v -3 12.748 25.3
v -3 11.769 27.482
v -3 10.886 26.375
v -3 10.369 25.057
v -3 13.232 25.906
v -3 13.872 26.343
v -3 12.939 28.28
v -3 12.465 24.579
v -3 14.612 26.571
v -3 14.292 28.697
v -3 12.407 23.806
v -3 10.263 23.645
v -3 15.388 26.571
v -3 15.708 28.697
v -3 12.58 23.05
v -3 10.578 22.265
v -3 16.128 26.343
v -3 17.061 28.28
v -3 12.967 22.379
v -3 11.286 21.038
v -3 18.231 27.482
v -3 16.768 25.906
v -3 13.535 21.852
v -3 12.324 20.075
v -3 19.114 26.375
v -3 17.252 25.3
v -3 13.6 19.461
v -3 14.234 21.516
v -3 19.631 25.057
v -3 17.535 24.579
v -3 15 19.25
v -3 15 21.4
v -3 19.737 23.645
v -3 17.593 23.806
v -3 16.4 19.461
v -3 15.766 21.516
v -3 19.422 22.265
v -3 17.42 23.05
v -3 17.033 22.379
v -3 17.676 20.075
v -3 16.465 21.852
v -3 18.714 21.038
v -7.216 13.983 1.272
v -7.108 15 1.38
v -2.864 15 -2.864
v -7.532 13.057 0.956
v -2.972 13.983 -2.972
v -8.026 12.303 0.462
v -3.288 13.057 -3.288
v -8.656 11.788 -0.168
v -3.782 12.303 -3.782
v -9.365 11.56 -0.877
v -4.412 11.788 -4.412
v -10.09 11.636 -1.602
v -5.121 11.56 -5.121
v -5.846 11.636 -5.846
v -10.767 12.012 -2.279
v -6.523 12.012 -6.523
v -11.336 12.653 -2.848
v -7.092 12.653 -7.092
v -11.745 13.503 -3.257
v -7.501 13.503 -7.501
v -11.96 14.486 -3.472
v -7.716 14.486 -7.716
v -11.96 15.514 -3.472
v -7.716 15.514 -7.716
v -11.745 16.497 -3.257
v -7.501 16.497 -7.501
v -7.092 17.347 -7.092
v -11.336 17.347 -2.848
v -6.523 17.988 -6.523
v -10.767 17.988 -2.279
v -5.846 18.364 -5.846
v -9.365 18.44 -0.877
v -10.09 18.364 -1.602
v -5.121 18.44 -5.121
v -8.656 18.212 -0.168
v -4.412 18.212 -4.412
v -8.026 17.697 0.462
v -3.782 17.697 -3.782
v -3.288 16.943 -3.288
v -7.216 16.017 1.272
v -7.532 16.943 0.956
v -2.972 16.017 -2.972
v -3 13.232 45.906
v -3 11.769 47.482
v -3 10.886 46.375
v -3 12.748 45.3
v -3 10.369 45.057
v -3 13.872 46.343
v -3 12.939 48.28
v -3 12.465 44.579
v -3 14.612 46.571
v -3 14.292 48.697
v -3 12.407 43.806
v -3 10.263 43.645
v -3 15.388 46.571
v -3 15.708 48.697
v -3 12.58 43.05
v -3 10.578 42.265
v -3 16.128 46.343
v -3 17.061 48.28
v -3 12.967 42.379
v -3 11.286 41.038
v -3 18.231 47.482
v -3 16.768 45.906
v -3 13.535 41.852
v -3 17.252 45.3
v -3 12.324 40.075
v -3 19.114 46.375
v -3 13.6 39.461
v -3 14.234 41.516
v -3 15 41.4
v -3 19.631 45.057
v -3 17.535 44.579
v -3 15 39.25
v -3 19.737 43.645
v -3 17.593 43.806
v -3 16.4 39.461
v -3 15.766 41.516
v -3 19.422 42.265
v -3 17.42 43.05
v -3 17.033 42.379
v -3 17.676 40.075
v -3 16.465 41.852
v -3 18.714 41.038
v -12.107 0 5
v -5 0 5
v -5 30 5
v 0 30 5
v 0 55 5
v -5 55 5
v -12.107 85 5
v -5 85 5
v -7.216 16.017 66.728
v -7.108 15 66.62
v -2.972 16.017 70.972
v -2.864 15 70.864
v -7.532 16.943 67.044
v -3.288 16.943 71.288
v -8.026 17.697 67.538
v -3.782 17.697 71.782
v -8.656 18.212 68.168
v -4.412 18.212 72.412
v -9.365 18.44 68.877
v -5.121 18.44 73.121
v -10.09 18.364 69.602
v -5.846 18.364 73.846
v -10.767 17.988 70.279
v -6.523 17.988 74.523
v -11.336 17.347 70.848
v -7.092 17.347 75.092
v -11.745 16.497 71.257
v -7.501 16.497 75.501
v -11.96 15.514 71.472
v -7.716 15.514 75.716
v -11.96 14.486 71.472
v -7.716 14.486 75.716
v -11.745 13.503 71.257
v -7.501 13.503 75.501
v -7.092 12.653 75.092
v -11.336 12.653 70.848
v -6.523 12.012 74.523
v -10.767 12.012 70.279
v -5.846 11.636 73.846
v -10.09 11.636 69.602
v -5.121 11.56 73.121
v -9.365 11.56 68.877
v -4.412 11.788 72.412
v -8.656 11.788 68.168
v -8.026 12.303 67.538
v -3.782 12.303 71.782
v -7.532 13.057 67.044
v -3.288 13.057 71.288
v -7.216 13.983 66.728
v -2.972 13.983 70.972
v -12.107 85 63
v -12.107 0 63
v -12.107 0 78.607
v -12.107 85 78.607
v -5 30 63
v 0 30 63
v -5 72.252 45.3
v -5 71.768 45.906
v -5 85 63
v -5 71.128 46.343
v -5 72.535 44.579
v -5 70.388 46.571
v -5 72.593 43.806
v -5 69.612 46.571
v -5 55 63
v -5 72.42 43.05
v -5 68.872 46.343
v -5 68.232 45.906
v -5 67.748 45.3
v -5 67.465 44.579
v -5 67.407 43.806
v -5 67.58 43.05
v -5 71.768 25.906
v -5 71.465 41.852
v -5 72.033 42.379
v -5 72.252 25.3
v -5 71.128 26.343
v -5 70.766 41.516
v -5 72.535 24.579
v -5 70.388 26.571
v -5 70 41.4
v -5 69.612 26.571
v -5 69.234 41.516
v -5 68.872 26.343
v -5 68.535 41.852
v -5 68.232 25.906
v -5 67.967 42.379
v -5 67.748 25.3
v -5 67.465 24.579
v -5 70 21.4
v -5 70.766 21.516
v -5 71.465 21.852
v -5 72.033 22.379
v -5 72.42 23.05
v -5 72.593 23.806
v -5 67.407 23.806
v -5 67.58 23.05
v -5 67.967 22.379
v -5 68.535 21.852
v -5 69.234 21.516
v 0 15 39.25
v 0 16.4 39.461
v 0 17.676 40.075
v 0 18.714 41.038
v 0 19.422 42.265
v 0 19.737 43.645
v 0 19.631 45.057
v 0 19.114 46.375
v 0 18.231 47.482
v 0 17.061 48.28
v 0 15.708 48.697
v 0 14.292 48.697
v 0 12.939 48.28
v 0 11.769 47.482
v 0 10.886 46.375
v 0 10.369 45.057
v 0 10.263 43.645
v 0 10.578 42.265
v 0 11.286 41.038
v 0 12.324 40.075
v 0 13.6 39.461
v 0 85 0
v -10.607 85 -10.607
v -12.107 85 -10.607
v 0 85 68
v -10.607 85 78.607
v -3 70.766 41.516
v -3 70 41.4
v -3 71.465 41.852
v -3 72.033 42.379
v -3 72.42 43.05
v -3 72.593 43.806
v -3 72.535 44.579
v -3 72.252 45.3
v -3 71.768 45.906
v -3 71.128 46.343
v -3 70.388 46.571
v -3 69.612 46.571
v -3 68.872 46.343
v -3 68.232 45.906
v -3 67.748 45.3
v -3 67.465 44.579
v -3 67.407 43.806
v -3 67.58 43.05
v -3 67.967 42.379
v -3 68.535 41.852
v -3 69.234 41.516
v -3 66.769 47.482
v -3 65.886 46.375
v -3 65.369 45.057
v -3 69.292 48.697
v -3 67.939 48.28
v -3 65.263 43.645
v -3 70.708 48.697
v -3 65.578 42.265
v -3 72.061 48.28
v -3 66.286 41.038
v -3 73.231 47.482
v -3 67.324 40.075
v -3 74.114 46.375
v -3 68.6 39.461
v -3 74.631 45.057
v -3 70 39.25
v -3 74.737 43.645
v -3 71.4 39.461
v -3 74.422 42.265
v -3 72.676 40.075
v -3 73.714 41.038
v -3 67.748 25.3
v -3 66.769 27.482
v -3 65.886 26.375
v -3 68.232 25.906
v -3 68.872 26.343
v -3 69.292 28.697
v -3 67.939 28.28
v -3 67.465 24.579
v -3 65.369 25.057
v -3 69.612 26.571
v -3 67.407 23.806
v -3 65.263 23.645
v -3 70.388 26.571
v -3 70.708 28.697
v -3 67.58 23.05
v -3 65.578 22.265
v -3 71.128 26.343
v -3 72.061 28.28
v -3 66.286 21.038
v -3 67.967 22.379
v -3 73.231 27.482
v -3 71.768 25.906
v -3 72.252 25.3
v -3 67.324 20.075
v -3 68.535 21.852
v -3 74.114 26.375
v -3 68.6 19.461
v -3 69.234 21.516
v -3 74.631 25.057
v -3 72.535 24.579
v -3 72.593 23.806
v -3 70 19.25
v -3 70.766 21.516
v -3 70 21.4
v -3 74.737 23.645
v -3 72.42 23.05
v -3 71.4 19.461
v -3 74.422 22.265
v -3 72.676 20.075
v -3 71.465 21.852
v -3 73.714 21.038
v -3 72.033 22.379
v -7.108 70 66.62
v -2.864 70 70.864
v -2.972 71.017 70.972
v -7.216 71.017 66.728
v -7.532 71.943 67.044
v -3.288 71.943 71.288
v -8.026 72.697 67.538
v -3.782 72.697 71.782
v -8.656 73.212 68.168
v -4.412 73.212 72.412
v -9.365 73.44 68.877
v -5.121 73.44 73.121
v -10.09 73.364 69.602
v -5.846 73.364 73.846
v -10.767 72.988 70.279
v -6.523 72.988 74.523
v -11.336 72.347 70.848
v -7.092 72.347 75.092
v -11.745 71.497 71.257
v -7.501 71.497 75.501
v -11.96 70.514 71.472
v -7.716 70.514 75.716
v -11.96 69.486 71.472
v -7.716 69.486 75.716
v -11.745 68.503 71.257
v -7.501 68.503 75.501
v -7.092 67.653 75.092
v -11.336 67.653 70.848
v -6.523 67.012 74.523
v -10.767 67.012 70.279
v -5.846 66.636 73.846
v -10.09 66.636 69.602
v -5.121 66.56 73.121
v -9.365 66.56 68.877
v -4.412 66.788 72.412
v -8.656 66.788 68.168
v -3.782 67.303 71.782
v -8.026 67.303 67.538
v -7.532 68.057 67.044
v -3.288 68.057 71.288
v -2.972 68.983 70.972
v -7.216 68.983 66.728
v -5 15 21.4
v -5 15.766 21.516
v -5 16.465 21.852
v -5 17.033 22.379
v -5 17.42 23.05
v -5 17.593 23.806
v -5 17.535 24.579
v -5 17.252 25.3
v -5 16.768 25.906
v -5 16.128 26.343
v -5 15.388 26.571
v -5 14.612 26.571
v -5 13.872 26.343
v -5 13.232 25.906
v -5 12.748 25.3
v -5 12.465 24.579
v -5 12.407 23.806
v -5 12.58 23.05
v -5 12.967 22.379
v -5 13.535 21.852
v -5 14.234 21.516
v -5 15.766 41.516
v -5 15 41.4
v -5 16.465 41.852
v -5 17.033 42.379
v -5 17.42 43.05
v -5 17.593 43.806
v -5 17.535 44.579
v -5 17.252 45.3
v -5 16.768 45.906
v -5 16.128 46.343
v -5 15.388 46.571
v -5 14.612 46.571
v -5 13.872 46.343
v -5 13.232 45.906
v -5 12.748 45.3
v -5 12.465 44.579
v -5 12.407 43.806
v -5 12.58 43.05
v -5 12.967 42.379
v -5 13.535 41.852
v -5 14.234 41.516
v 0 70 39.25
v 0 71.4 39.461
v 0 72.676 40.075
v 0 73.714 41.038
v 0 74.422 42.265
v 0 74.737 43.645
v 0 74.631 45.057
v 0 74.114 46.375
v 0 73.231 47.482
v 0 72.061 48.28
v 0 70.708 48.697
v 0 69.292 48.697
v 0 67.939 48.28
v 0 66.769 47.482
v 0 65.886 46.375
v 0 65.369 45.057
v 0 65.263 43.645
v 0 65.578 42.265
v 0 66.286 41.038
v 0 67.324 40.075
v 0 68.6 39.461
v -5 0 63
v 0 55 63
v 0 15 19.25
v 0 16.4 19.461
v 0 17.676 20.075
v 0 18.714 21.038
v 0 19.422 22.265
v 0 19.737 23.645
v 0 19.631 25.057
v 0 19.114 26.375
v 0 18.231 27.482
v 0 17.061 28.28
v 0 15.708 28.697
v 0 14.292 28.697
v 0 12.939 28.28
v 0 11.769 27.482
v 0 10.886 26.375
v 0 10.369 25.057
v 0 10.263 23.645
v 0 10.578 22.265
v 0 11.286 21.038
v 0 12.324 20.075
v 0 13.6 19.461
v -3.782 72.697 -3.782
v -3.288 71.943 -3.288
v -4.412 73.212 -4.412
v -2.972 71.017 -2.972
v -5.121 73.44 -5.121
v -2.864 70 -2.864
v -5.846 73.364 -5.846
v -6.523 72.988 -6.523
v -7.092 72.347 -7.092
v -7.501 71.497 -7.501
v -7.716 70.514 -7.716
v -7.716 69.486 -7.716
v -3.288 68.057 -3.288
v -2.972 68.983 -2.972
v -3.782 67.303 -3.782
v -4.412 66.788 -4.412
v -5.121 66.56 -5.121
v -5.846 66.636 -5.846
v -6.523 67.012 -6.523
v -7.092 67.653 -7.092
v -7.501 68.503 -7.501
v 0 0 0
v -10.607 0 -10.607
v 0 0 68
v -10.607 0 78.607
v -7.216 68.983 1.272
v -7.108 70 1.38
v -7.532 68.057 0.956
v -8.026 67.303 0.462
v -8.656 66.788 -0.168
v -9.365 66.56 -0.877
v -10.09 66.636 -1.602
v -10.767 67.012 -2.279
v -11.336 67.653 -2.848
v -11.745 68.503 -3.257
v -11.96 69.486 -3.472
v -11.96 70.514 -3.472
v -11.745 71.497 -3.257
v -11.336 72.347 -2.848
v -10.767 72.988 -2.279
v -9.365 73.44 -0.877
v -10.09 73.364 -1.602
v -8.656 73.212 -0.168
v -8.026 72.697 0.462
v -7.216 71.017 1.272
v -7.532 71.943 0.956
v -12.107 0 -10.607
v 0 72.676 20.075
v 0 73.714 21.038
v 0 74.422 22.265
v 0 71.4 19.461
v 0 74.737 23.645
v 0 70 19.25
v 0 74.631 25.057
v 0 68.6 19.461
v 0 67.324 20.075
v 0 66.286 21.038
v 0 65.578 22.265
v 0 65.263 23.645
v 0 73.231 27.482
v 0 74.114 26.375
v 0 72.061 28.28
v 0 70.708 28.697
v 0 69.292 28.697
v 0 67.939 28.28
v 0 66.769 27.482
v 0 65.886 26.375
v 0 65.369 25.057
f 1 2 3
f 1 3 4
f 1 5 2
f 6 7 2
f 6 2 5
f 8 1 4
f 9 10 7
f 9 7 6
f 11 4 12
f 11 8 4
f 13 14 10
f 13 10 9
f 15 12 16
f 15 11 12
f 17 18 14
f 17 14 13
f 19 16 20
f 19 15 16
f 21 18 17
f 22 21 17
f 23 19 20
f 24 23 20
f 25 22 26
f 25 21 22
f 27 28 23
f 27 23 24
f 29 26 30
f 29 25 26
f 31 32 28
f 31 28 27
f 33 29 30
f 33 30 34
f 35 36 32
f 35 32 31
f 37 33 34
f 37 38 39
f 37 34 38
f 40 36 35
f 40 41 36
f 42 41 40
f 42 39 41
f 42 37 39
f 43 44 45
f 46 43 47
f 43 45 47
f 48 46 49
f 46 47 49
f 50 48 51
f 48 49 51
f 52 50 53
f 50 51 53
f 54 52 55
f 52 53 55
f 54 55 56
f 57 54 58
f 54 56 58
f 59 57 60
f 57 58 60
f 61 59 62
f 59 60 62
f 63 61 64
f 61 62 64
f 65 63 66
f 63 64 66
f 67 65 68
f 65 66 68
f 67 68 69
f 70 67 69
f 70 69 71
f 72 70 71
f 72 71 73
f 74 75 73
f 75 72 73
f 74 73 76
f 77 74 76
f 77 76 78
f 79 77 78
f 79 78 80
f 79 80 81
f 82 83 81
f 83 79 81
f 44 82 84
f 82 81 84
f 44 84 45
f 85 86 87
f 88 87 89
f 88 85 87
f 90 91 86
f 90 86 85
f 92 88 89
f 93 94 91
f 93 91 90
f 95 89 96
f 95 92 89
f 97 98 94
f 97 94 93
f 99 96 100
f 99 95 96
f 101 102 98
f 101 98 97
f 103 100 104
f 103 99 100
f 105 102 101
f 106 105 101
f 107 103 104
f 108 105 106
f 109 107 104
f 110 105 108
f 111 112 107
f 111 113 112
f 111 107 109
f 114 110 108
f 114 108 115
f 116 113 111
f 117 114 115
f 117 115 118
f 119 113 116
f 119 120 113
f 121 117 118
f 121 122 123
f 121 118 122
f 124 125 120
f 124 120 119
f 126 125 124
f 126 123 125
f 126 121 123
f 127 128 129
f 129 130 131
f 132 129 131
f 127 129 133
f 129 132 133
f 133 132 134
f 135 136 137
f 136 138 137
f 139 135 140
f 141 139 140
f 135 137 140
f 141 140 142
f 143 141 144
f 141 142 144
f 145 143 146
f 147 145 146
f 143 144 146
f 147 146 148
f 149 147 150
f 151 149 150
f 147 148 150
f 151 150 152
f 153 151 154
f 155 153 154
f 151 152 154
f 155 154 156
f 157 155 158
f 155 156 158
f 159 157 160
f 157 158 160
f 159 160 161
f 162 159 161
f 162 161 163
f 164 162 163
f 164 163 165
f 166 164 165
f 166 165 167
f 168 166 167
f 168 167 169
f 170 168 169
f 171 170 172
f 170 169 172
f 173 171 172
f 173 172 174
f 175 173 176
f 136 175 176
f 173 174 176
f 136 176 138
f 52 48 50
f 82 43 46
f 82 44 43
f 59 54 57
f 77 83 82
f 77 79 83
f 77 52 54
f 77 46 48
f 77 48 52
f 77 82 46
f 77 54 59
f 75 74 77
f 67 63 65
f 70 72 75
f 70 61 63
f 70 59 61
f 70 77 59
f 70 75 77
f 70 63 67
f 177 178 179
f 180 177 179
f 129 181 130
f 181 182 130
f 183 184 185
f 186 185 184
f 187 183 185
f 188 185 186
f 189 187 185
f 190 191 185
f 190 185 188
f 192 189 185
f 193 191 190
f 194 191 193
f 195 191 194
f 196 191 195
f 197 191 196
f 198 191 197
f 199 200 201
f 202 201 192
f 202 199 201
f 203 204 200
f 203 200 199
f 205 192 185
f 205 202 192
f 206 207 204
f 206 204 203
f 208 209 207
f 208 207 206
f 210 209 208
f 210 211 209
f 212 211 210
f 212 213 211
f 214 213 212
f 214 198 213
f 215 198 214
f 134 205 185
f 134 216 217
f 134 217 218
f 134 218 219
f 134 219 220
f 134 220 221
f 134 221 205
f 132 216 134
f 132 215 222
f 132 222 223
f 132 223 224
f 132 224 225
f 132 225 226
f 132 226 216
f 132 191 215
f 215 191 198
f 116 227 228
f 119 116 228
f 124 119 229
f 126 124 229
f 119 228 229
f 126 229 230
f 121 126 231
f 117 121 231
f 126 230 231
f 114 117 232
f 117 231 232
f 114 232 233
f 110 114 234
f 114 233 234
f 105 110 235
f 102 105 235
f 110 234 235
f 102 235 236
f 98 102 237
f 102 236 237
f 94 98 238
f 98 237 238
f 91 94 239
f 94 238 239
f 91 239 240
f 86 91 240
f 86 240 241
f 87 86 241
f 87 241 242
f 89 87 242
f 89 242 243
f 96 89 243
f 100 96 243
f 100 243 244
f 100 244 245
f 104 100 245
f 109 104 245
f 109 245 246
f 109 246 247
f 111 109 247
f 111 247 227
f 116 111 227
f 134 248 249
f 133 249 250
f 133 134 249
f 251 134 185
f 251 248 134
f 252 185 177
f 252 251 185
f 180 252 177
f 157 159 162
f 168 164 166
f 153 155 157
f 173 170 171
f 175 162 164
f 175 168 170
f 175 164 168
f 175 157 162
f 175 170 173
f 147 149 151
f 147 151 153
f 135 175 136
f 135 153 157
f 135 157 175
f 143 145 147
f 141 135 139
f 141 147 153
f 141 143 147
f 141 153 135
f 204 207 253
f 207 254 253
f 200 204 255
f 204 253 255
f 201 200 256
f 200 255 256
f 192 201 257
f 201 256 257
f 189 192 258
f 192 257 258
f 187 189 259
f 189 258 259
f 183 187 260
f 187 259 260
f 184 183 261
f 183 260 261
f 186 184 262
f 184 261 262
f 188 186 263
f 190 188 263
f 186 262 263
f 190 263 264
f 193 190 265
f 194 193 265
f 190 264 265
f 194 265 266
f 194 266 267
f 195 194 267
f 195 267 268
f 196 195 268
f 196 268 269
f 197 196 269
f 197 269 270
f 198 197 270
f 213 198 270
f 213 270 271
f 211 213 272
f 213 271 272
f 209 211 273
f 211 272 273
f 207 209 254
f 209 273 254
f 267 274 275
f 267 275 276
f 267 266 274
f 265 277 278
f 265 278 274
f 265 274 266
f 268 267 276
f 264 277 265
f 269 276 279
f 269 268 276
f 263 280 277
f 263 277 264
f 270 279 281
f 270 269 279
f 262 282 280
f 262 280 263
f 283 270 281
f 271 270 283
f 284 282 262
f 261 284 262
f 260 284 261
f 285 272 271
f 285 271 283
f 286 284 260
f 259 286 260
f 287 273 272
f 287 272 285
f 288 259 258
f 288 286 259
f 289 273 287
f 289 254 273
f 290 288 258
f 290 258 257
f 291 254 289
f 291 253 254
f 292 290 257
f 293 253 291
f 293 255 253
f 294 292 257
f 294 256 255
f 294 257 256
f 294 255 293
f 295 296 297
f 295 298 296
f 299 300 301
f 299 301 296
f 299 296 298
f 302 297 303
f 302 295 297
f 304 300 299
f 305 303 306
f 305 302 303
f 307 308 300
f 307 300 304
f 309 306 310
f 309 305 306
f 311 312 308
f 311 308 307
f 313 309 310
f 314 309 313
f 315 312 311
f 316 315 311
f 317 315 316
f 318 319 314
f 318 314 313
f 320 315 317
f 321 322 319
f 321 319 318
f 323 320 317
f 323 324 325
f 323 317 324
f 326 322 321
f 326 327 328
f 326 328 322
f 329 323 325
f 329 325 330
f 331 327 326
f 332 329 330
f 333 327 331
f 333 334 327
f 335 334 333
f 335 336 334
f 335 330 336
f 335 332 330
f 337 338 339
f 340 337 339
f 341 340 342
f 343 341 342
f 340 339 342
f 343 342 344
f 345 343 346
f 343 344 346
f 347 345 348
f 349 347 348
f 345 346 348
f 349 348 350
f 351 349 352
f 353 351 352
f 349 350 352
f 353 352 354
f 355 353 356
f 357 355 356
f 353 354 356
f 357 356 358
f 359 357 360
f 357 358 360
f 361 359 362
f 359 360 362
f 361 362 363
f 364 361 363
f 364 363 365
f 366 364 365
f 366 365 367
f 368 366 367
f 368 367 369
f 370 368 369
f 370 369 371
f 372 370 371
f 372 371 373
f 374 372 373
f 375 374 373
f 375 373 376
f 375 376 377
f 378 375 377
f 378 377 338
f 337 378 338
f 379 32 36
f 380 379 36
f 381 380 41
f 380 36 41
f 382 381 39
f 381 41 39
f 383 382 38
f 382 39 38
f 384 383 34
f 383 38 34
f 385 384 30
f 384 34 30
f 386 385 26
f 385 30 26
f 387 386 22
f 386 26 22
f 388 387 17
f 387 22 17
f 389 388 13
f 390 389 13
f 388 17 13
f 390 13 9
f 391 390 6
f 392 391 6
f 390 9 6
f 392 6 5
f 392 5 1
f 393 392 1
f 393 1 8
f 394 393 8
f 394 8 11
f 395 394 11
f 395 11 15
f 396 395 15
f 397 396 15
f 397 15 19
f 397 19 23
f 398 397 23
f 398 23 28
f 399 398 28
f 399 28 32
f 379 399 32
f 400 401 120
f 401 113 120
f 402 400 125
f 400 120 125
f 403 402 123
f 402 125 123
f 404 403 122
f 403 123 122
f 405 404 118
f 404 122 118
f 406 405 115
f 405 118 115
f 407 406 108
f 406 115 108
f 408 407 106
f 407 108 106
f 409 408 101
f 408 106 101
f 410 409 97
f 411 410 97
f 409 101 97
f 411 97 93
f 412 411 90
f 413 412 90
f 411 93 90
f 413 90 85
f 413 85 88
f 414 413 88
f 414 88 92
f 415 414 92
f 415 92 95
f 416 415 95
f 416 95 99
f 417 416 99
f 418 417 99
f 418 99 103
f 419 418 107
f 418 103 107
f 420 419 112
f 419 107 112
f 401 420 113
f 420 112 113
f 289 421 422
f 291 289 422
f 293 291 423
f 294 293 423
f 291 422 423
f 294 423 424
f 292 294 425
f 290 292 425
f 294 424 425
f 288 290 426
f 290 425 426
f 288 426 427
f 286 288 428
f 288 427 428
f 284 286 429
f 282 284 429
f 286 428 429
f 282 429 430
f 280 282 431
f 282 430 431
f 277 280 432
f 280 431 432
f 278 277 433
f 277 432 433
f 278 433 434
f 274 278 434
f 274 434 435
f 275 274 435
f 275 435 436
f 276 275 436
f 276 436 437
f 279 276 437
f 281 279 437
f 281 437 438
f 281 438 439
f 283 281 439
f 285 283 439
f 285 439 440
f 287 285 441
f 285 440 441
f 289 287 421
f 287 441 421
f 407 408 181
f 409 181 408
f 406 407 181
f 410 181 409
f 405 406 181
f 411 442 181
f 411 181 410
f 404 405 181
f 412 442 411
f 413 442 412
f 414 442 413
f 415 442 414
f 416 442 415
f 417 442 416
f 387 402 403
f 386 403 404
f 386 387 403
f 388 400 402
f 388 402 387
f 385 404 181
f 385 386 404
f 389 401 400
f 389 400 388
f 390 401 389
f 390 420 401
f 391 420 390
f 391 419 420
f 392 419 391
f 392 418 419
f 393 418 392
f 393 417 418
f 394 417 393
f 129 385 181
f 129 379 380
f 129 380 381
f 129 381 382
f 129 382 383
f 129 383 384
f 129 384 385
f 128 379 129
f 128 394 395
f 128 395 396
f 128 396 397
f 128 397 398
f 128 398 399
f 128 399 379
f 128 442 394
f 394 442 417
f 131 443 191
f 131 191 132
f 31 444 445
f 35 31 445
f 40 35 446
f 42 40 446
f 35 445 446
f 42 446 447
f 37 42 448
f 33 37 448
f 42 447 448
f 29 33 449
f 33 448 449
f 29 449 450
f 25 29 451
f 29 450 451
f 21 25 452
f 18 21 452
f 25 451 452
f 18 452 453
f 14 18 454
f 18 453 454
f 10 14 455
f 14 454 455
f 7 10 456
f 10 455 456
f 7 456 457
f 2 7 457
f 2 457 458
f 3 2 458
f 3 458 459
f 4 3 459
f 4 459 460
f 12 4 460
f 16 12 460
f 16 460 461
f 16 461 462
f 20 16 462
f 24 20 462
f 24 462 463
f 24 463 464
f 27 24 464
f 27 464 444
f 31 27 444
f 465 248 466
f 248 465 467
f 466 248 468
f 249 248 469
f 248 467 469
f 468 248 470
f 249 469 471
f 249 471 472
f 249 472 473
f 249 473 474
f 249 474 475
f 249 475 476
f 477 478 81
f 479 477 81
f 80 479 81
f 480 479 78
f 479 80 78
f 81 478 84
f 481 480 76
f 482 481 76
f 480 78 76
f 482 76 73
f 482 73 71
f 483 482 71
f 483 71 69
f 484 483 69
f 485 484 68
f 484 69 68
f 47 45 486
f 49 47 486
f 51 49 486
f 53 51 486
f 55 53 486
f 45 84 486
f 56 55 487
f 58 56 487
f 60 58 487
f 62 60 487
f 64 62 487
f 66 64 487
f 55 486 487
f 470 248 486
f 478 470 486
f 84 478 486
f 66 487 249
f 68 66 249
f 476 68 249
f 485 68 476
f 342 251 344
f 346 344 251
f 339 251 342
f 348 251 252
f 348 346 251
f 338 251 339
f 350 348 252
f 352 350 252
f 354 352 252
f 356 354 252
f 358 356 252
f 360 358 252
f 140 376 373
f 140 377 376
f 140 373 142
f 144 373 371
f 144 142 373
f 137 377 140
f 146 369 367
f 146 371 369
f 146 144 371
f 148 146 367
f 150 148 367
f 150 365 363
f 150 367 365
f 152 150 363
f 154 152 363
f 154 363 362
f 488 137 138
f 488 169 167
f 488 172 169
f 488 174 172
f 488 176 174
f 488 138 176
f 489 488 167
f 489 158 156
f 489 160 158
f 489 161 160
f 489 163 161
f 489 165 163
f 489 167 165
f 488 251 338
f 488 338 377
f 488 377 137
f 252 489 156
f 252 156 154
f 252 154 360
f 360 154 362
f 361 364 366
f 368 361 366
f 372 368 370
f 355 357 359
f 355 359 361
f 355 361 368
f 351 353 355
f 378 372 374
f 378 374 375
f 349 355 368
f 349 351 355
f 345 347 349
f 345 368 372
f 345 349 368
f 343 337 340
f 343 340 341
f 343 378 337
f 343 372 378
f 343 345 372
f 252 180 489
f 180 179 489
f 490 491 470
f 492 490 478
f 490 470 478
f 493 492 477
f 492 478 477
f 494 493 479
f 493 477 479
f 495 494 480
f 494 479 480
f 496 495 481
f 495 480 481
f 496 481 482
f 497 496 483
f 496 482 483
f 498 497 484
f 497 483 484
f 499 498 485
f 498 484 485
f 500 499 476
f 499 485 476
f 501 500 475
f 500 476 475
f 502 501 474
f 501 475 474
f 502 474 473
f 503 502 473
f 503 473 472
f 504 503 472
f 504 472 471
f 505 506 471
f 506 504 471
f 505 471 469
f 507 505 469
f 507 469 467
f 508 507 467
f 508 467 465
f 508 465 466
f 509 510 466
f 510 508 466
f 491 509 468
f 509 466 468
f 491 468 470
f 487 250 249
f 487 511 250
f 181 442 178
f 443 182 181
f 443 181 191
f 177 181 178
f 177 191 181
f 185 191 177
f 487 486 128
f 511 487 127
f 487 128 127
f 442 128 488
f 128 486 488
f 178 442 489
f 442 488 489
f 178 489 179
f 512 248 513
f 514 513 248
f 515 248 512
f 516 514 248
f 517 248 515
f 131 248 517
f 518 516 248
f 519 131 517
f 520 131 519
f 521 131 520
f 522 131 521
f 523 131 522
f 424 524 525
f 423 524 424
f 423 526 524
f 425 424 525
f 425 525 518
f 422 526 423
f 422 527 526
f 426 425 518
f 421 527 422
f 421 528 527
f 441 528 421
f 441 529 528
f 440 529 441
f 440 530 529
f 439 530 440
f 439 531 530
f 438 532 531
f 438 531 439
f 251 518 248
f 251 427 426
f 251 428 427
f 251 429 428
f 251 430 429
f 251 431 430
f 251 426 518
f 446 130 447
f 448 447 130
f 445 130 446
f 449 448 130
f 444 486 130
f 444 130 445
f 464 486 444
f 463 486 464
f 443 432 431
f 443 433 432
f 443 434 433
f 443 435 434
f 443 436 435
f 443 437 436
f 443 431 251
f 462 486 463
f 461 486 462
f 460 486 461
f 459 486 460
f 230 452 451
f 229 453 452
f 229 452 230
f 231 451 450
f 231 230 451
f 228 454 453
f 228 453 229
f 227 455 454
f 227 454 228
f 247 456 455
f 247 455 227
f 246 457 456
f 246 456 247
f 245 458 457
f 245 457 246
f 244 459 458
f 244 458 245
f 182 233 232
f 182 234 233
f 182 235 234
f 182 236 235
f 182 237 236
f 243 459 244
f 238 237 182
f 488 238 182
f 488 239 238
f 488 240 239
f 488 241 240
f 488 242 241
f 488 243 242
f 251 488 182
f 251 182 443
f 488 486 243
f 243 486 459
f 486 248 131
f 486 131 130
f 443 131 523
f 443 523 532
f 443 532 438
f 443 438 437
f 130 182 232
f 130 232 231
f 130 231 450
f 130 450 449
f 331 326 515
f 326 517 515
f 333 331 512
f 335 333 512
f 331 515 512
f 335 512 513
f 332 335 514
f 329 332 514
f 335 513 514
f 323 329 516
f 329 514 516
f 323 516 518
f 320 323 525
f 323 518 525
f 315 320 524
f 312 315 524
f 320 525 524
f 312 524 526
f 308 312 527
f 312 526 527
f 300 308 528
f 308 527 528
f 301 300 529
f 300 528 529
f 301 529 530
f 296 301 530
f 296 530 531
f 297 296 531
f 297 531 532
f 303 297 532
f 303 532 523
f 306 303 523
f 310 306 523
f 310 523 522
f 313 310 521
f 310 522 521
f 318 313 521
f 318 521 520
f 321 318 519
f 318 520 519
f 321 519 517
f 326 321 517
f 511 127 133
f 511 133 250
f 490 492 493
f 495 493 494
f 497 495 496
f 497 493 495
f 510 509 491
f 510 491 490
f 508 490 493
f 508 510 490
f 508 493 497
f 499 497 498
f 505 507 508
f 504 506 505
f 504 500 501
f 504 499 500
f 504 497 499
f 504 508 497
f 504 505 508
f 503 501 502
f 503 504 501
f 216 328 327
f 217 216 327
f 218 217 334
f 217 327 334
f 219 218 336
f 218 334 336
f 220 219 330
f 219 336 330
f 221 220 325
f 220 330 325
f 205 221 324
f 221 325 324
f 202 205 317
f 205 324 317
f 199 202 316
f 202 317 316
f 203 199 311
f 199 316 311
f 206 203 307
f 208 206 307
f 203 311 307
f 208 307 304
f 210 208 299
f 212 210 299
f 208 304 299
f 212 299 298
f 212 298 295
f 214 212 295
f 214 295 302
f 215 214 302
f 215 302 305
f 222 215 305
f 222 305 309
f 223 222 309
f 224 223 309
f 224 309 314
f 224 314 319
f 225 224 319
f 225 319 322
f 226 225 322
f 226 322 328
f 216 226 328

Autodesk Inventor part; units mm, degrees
ref_plane "YZ Plane" through (0, 0, 0) normal (1, 0, 0) x (0, 1, 0)
ref_plane "XZ Plane" through (0, 0, 0) normal (0, 1, 0) x (-1, 0, 0)
sketch "Sketch1" plane through (0, 0, 0) normal (0, 1, 0) x (-1, 0, 0)
  line L0 (0, 0) -> (0, 68)
  line L1 (0, 0) -> (10.6066, -10.6066)
  line L2 (0, 68) -> (10.6066, 78.6066)
  line L3 (5, 63) -> (5, 5)
  line L4 (10.6066, 78.6066) -> (10.6066, 63)
  line L5 (10.6066, -10.6066) -> (10.6066, 5)
  line L6 (10.6066, 63) -> (5, 63)
  line L7 (10.6066, 5) -> (5, 5)
  line L8 (10.6066, 5) -> (12.1066, 5)
  line L9 (12.1066, 5) -> (12.1066, -10.6066)
  line L10 (12.1066, -10.6066) -> (10.6066, -10.6066)
  line L11 (10.6066, -10.6066) -> (10.6066, 5)
  line L12 (10.6066, 63) -> (12.1066, 63)
  line L13 (12.1066, 63) -> (12.1066, 78.6066)
  line L14 (12.1066, 78.6066) -> (10.6066, 78.6066)
  line L15 (10.6066, 78.6066) -> (10.6066, 63)
  dimension "d0" = 68
  dimension "d1" = 15
  dimension "d2" = 135
  dimension "d4" = 15
  dimension "d5" = 135
  dimension "d6" = 5
  dimension "d7" = 5
  dimension "d8" = 5
  dimension "d35" = 1.5
extrude "Extrusion1" add sketch "Sketch1" along normal blind 85
sketch "Sketch2" plane through (0, 0, 68) normal (0.7071, 0, 0.7071) x (0.7071, 0, -0.7071)
  line L0 (-15, 0) -> (0, 0) construction
  line L1 (-7.5, 0) -> (-7.5, 200) construction
  circle A0 centre (-7.5, 70) radius 3.45
  circle A1 centre (-7.5, 15) radius 3.45
  line L2 (-15, 85) -> (0, 85) projected
  point P0 (48.0833, 0)
  point P1 (-15, 200)
  dimension "d11" = 6.9
  dimension "d12" = 6.9
  dimension "d13" = 15
  dimension "d14" = 15
extrude "Extrusion2" cut sketch "Sketch2" against normal blind 6
sketch "Sketch3" plane through (0, 0, 68) normal (1, 0, 0) x (0, 0, -1)
  ellipse E0 centre (-5.3033, 70) end of major axis (-5.3033, 66.55) minor radius 2.4395 construction
  ellipse E1 centre (73.3033, 70) end of major axis (73.3033, 73.45) minor radius 2.4395 construction
  line L0 (-5.3033, 70) -> (73.3033, 70) construction
  ellipse E2 centre (-5.3033, 15) end of major axis (-5.3033, 11.55) minor radius 2.4395 construction
  ellipse E3 centre (73.3033, 15) end of major axis (73.3033, 18.45) minor radius 2.4395 construction
  line L1 (-5.3033, 15) -> (73.3033, 15) construction
  line L2 (0, 85) -> (68, 85) construction
  line L3 (34, 85) -> (34, 0) construction
  line L4 (63, 0) -> (5, 0) construction
  line L5 (44, 85) -> (44, -115) construction
  line L6 (24, 85) -> (24, -115) construction
  circle A0 centre (44, 70) radius 2.6
  circle A1 centre (24, 70) radius 2.6
  circle A2 centre (24, 15) radius 2.6
  circle A3 centre (44, 15) radius 2.6
  point P0 (68, 0)
  dimension "d17" = 10
  dimension "d18" = 10
  dimension "d19" = 5.2
  dimension "d20" = 5.2
  dimension "d21" = 5.2
  dimension "d22" = 5.2
extrude "Extrusion3" cut sketch "Sketch3" against normal up to next
sketch "Sketch4" plane through (0, 0, 68) normal (1, 0, 0) x (0, 0, -1)
  line L0 (5, 0) -> (5, 85) projected
  line L1 (63, 0) -> (63, 85) projected
  line L2 (5, 55) -> (63, 55)
  line L3 (5, 30) -> (63, 30)
  circle A0 centre (24, 70) radius 2.6 projected
  circle A1 centre (24, 15) radius 2.6 projected
  point P0 (68, 0)
  dimension "d25" = 15
  dimension "d26" = 15
extrude "Extrusion4" cut sketch "Sketch4" against normal up to next contours L0 L2 L1 L3
sketch "Sketch5" plane through (0, 0, 68) normal (1, 0, 0) x (0, 0, -1)
  circle A0 centre (24, 70) radius 2.6 projected
  circle A1 centre (24, 70) radius 4.75
  circle A2 centre (44, 70) radius 2.6 projected
  circle A3 centre (44, 70) radius 4.75
  circle A4 centre (24, 15) radius 2.6 projected
  circle A5 centre (24, 15) radius 4.75
  circle A6 centre (44, 15) radius 2.6 projected
  circle A7 centre (44, 15) radius 4.75
  point P0 (68, 0)
  dimension "d29" = 9.5
  dimension "d30" = 9.5
  dimension "d31" = 9.5
  dimension "d32" = 9.5
extrude "Extrusion5" cut sketch "Sketch5" against normal blind 3
ref_plane "Work Plane2" through (-12.1066, 0, 34) normal (0, 0, 1) x (1, 0, 0)
mirror "Mirror2" about plane through (-12.1066, 0, 34) normal (0, 0, 1) of "Extrusion2"
equation "\"d4\" = d1"
equation "\"d5\" = d2"
equation "\"d12\" = d11"
equation "\"d14\" = d13"
equation "\"d20\" = d19"
equation "\"d21\" = d19"
equation "\"d22\" = d19"
equation "\"d30\" = d29"
equation "\"d31\" = d29"
equation "\"d32\" = d29"
properties part number "Z Axis Cover Frame Bottom"
